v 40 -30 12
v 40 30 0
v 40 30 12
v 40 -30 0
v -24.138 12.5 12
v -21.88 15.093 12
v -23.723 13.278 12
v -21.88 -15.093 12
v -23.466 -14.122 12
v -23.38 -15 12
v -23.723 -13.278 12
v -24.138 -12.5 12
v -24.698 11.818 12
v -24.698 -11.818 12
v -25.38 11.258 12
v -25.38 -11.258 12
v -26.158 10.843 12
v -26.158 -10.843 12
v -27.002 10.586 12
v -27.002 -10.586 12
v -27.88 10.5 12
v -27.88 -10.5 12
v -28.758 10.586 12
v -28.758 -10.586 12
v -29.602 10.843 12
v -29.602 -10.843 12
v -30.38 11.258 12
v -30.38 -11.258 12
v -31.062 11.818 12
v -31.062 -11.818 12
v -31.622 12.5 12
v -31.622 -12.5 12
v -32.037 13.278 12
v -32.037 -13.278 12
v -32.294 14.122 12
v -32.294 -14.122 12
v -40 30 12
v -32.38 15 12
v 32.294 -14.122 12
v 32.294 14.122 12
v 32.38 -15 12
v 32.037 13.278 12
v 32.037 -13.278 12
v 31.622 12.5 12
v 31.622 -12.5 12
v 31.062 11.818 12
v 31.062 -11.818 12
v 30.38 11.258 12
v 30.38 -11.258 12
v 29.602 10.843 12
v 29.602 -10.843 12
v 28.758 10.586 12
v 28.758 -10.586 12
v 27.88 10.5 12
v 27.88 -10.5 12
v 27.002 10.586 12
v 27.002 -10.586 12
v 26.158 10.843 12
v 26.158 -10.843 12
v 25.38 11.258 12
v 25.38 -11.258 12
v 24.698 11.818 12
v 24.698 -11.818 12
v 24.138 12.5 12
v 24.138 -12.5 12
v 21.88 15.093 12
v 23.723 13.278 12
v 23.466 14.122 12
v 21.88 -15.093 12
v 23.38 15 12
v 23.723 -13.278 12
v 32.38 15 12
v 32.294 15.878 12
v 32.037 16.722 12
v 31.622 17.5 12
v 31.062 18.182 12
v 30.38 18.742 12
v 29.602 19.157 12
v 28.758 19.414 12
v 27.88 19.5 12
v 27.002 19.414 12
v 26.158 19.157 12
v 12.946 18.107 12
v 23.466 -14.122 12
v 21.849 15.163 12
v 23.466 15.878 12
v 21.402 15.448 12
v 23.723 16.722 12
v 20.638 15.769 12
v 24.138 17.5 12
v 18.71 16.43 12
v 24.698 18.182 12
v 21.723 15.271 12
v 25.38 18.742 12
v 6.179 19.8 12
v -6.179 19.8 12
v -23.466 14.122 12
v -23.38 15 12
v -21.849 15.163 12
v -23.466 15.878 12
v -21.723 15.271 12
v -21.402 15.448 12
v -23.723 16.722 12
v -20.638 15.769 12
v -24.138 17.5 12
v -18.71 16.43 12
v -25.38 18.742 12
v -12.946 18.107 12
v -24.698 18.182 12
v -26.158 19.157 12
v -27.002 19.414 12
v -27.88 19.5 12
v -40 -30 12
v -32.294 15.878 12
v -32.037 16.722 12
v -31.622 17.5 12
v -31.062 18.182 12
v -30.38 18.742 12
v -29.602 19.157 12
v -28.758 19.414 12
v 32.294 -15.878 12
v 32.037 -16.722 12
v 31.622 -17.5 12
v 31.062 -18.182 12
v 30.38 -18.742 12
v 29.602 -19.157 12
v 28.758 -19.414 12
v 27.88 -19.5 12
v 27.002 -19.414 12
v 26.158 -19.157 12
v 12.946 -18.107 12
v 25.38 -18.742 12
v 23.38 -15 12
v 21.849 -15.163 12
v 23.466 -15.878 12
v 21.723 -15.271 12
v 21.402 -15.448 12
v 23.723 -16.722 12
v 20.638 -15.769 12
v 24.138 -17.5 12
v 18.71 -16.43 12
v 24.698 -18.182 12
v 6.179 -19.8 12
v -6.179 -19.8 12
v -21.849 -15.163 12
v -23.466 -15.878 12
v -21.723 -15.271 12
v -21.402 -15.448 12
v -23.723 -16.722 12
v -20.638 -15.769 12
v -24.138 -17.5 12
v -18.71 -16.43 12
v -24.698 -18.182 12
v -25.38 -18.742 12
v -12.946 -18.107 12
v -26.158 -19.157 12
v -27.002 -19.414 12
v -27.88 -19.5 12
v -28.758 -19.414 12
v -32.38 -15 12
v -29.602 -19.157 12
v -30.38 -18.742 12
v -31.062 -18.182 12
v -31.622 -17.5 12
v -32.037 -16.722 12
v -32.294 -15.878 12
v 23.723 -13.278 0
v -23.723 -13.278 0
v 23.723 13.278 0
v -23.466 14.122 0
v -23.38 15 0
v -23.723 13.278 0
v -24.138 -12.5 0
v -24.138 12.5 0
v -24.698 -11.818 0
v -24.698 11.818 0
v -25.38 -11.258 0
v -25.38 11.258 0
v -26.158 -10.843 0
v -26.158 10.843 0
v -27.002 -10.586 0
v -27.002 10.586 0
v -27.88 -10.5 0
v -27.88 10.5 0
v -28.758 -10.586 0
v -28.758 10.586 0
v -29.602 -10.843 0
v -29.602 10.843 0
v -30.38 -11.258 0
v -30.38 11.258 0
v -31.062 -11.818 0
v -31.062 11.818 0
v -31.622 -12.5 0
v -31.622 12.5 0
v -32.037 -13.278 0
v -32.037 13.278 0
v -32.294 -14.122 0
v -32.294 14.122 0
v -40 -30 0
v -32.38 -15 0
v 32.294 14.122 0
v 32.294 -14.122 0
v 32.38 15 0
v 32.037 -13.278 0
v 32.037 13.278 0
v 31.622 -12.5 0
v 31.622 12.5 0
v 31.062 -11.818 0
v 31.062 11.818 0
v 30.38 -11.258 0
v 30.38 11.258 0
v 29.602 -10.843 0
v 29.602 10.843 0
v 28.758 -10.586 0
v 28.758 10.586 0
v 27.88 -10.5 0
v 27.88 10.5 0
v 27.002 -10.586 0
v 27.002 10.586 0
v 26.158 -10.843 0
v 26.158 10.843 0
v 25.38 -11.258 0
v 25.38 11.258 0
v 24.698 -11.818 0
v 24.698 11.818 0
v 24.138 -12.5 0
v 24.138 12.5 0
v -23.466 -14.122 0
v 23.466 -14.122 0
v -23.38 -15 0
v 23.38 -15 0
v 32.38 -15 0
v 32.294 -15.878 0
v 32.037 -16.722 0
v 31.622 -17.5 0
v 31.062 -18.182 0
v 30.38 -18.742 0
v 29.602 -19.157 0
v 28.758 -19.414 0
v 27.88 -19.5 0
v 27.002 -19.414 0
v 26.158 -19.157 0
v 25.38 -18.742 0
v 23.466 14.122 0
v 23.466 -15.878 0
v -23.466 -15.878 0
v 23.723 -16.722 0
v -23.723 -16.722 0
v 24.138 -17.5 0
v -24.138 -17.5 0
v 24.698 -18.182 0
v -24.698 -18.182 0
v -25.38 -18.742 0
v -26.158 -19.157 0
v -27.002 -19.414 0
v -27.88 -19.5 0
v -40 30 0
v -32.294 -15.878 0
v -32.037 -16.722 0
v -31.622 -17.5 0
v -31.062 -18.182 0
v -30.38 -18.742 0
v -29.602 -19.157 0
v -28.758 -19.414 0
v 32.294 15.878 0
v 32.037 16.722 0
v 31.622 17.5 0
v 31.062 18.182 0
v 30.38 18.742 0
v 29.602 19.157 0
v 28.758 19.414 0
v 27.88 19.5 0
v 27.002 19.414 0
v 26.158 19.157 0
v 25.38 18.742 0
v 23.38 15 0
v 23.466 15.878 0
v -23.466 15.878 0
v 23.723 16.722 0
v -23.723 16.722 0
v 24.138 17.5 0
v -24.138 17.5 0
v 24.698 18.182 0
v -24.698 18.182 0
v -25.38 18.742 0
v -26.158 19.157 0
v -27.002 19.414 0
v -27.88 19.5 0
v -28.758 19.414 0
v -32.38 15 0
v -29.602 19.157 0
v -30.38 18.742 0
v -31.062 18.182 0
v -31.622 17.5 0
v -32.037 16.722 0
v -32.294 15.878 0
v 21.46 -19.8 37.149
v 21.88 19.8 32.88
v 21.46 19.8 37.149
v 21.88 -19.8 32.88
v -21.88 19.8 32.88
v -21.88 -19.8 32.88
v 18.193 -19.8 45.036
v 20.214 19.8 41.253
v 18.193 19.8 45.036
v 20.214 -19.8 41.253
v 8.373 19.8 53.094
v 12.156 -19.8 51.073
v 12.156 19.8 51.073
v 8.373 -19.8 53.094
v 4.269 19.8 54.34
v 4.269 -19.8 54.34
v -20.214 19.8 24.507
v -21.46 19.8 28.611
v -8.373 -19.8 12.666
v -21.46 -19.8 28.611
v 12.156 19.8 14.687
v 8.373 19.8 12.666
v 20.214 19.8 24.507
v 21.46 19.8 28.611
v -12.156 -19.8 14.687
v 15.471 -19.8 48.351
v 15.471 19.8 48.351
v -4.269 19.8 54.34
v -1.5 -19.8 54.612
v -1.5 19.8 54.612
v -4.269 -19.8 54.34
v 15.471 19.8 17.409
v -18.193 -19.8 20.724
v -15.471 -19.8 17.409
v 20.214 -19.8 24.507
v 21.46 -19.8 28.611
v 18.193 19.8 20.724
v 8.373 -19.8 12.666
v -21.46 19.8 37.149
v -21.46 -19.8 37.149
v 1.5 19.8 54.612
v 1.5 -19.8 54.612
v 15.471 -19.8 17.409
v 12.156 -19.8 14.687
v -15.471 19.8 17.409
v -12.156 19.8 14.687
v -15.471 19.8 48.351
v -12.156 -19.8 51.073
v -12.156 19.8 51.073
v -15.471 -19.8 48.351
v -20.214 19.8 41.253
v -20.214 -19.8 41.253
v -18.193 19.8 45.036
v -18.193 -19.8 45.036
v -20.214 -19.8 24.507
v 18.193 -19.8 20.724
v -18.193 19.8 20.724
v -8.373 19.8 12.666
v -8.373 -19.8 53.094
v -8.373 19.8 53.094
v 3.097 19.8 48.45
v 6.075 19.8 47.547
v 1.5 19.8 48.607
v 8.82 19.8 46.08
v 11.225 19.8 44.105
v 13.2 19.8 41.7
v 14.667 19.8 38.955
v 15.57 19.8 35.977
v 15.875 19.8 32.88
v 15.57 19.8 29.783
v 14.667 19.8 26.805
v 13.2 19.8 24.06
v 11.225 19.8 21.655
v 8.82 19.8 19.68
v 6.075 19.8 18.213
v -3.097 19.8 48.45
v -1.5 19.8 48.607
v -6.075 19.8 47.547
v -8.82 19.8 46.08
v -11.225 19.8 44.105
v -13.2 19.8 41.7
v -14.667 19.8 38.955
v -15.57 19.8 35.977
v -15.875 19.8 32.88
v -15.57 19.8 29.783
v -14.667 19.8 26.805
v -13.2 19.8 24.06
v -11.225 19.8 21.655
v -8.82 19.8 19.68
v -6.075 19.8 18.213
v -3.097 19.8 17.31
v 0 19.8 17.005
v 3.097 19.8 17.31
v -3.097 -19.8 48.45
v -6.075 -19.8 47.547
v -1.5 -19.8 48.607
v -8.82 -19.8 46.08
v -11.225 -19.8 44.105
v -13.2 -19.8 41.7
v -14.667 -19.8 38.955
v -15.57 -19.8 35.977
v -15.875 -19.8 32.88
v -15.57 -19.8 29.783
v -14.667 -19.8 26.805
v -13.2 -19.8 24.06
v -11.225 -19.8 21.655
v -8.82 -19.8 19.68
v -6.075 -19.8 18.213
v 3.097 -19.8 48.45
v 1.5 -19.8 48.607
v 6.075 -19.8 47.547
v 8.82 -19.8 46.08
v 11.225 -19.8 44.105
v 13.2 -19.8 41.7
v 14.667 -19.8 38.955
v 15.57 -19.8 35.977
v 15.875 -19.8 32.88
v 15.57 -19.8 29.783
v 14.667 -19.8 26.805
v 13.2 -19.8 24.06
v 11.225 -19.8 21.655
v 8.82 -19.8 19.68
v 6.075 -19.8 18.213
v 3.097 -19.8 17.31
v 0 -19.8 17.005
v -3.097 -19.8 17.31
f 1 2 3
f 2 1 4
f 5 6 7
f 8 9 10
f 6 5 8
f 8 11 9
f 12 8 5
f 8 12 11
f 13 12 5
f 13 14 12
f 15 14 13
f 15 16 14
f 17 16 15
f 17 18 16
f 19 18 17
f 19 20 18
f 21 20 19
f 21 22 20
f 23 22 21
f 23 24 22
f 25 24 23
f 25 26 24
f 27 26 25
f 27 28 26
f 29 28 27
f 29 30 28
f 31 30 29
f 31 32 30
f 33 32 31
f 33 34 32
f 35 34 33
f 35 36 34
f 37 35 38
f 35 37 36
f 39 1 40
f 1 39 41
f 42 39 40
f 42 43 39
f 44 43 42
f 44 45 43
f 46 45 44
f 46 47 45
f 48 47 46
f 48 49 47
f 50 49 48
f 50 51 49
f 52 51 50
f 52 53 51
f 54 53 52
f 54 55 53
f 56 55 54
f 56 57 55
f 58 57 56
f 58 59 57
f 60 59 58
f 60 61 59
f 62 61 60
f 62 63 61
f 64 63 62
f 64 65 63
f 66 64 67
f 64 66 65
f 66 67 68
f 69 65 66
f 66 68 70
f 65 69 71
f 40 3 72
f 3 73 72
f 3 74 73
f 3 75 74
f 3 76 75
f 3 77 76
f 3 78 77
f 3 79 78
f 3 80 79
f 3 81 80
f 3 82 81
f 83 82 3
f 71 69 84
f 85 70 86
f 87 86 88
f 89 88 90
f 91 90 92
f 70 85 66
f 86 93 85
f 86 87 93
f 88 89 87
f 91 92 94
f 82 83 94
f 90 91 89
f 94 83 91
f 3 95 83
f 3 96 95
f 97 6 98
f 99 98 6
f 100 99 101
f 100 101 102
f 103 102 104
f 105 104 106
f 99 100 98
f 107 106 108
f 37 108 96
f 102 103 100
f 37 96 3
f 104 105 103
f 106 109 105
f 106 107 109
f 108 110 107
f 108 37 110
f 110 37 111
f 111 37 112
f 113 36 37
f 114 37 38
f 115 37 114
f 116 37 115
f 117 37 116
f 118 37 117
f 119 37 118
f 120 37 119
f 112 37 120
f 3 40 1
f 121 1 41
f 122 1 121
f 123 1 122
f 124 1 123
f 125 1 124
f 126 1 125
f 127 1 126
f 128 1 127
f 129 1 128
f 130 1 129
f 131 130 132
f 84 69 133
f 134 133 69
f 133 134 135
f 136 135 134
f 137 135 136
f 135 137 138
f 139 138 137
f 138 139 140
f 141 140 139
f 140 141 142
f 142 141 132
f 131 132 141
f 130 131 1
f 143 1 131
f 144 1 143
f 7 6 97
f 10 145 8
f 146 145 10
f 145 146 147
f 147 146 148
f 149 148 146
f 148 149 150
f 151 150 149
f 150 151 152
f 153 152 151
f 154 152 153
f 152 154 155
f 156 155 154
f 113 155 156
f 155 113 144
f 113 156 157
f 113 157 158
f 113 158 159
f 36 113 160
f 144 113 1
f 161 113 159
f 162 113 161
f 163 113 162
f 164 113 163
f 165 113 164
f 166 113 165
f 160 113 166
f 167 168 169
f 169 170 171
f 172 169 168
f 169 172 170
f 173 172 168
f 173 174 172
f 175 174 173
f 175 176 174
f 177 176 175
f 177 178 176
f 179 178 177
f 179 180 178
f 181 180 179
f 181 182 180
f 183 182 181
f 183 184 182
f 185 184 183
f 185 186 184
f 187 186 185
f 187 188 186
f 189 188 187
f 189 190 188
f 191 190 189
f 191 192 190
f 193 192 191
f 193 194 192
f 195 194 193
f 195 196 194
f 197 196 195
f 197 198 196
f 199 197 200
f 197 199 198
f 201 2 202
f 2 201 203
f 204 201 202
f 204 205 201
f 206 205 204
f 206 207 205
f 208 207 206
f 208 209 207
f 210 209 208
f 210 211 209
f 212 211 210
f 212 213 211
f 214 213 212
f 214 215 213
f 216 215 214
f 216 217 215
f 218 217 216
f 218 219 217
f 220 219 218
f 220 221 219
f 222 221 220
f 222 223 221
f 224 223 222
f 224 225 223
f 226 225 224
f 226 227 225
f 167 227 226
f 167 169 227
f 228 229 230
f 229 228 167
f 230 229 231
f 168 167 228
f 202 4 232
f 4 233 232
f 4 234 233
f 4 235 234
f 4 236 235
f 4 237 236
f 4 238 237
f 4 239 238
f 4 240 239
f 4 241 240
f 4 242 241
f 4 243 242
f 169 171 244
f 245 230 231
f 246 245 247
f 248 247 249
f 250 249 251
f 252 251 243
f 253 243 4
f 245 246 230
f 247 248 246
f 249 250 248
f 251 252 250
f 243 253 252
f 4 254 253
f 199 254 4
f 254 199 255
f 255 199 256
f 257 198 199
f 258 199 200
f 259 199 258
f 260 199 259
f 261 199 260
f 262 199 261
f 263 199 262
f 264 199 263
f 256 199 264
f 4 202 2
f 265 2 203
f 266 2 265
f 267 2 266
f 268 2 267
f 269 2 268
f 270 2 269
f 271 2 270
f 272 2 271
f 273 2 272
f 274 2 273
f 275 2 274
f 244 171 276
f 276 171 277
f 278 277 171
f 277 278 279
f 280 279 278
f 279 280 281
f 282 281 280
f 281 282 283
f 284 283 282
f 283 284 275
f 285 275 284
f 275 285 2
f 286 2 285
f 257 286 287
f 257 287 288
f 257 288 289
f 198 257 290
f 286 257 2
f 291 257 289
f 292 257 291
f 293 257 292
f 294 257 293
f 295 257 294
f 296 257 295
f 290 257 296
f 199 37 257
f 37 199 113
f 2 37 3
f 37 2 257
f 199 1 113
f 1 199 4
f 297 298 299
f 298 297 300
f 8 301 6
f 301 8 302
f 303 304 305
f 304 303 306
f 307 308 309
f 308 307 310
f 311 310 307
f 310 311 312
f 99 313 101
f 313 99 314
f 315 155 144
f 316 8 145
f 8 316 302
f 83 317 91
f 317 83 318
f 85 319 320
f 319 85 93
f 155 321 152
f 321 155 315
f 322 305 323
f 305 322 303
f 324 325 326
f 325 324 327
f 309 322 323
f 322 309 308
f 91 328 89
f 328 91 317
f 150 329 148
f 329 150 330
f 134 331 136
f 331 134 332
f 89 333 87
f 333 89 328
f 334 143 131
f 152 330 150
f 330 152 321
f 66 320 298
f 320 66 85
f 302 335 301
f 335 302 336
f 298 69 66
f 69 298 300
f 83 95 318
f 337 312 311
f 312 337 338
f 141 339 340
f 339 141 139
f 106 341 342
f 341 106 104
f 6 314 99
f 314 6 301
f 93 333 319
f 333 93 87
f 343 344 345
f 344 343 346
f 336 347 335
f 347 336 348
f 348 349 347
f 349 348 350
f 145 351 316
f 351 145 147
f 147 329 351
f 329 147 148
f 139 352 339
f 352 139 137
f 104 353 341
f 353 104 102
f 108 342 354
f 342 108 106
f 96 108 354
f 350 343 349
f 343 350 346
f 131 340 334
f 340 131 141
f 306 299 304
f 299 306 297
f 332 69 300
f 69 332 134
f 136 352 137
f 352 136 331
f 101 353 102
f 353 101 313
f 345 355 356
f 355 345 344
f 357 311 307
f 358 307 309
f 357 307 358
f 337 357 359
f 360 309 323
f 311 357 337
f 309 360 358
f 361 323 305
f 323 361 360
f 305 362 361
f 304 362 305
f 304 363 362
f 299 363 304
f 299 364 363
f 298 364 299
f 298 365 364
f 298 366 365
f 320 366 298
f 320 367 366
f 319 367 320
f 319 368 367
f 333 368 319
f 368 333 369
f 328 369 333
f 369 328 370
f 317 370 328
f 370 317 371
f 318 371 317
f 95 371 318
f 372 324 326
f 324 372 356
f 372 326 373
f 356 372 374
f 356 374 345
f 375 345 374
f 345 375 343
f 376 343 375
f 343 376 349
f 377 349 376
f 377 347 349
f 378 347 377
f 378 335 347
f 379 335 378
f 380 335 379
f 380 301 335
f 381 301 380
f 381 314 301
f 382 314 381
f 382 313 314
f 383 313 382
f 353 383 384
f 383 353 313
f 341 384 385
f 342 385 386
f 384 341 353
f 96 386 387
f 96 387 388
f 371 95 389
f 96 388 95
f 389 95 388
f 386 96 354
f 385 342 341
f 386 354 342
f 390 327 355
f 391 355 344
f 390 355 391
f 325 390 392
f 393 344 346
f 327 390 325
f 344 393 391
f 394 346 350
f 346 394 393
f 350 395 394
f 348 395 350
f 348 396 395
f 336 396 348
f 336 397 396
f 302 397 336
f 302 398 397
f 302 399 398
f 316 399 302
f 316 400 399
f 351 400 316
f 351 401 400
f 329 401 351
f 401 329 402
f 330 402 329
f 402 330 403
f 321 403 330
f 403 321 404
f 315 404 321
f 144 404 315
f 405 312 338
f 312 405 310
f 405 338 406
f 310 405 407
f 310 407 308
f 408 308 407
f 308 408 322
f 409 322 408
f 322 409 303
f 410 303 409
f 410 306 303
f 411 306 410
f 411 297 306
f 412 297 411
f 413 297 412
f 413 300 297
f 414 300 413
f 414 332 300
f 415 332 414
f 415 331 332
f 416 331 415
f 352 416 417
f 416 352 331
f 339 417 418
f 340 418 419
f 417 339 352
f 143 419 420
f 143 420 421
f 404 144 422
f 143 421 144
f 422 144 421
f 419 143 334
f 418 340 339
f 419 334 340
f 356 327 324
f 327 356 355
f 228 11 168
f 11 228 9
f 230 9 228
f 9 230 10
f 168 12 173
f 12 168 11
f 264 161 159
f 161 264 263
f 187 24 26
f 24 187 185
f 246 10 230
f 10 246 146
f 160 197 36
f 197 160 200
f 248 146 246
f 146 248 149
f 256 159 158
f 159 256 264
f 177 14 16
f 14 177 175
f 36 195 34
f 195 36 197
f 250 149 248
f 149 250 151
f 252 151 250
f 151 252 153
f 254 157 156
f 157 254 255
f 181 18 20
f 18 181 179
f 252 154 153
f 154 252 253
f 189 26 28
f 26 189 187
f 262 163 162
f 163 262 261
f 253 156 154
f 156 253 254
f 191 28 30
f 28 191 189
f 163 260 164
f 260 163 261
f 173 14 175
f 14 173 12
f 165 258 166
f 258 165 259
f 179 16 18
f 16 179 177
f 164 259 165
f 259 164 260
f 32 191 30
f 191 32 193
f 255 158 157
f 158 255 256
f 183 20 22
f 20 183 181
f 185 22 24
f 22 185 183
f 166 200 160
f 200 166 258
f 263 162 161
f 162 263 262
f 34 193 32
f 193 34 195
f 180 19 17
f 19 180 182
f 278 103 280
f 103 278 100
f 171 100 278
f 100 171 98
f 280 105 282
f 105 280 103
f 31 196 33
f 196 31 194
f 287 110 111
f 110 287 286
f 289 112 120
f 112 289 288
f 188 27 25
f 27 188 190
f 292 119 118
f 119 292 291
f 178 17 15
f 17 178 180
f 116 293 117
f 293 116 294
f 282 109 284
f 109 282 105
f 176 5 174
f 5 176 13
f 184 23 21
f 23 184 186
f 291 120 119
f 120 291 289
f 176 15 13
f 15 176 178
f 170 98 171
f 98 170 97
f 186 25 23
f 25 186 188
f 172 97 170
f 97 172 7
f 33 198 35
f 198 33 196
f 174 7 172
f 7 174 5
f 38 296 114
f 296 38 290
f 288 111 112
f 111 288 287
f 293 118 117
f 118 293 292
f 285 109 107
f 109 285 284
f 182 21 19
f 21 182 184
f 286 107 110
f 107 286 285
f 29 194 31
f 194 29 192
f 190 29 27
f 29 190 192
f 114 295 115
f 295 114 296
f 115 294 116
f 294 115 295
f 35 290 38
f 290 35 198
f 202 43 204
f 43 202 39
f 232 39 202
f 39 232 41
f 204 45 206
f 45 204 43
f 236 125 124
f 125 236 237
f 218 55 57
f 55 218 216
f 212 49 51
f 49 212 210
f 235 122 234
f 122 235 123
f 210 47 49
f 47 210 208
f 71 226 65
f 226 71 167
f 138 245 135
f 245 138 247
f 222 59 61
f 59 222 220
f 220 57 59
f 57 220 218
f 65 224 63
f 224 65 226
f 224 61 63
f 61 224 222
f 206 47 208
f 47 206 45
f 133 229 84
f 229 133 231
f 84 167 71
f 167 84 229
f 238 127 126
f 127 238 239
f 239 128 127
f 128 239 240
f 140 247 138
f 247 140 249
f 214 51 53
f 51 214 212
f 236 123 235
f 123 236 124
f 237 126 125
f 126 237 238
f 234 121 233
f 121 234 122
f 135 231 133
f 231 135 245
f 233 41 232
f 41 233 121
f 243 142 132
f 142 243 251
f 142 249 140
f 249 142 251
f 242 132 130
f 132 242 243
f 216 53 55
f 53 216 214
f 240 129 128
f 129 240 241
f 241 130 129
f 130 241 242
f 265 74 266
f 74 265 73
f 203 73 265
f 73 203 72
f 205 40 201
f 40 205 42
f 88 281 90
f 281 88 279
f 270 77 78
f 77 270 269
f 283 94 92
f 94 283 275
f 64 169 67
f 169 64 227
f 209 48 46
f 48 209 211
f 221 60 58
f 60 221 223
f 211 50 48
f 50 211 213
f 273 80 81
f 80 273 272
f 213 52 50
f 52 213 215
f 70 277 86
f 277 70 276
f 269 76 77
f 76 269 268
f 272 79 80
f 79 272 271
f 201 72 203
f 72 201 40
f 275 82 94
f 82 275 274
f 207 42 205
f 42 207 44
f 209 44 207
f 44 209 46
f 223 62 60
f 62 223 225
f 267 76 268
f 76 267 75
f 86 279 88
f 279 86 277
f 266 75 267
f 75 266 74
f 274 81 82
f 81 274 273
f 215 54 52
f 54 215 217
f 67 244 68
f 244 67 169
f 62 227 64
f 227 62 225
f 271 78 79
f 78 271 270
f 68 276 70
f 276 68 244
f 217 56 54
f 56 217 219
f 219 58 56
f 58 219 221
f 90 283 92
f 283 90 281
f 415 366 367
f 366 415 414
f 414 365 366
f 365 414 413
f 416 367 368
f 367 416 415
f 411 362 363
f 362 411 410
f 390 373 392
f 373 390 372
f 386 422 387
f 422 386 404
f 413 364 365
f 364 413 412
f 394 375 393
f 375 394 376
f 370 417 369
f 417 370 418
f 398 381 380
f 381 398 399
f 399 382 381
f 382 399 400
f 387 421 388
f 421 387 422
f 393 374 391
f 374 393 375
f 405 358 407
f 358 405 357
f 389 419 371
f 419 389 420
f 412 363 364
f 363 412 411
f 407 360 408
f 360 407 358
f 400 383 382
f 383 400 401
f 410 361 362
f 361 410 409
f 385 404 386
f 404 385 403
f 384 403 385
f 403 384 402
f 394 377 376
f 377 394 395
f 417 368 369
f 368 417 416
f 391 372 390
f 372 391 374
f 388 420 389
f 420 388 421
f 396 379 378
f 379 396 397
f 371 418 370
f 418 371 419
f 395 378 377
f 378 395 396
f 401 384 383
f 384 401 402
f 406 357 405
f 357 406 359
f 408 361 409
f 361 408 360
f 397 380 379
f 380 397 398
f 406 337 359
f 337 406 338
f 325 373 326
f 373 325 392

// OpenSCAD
$fn = 32;

// ----------------------------------------------------------------------
// Bearing block: 80 x 60 mm base, 31.75 mm bore at 32.88 mm
// ----------------------------------------------------------------------

// --- parameters (mm) ---
base_w = 80;              // base width
base_d = 60;              // base depth
base_t = 12;              // base thickness
bore_d = 31.75;           // shaft / bearing bore
house_r = 21.88;          // housing outer radius
house_len = 39.6;         // housing length along the shaft
foot_w = 43.76;           // foot width under the housing
foot_len = 29.6;          // foot length along the shaft
axis_z = 32.88;           // bore axis height above the base
holes_d = 9;              // mounting holes
hole_x = 27.88;           // mounting hole spacing
groove_w = 3;             // oil groove width

difference() {
  union() {
    /* base plate with its underside on z = 0 */
    translate([0, 0, base_t / 2]) cube([base_w, base_d, base_t], center = true);
    /* hull foot: a straight web blending into the round housing */
    hull() {
      translate([0, 0, base_t - 0.5]) cube([foot_w, foot_len, 1.6], center = true);
      translate([0, 0, axis_z]) rotate([-90, 0, 0]) cylinder(h = house_len, d = 2 * house_r, center = true);
    }
  }
  /* bore through the housing, 2.5 mm clear on both sides */
  translate([0, 0, axis_z]) rotate([-90, 0, 0]) cylinder(h = house_len + 5, d = bore_d, center = true);
  /* oil groove from the top of the housing into the bore */
  translate([-groove_w / 2, -house_len / 2 - 2.5, axis_z + bore_d * 0.17]) cube([groove_w, house_len + 5, house_r + 5]);
  /* mounting holes through the base plate */
  for (hx = [-27.88, 27.88]) {
    for (hy = [-15, 15]) {
      translate([hx, hy, -2.5]) cylinder(h = base_t + 5, d = holes_d);
    }
  }
}
